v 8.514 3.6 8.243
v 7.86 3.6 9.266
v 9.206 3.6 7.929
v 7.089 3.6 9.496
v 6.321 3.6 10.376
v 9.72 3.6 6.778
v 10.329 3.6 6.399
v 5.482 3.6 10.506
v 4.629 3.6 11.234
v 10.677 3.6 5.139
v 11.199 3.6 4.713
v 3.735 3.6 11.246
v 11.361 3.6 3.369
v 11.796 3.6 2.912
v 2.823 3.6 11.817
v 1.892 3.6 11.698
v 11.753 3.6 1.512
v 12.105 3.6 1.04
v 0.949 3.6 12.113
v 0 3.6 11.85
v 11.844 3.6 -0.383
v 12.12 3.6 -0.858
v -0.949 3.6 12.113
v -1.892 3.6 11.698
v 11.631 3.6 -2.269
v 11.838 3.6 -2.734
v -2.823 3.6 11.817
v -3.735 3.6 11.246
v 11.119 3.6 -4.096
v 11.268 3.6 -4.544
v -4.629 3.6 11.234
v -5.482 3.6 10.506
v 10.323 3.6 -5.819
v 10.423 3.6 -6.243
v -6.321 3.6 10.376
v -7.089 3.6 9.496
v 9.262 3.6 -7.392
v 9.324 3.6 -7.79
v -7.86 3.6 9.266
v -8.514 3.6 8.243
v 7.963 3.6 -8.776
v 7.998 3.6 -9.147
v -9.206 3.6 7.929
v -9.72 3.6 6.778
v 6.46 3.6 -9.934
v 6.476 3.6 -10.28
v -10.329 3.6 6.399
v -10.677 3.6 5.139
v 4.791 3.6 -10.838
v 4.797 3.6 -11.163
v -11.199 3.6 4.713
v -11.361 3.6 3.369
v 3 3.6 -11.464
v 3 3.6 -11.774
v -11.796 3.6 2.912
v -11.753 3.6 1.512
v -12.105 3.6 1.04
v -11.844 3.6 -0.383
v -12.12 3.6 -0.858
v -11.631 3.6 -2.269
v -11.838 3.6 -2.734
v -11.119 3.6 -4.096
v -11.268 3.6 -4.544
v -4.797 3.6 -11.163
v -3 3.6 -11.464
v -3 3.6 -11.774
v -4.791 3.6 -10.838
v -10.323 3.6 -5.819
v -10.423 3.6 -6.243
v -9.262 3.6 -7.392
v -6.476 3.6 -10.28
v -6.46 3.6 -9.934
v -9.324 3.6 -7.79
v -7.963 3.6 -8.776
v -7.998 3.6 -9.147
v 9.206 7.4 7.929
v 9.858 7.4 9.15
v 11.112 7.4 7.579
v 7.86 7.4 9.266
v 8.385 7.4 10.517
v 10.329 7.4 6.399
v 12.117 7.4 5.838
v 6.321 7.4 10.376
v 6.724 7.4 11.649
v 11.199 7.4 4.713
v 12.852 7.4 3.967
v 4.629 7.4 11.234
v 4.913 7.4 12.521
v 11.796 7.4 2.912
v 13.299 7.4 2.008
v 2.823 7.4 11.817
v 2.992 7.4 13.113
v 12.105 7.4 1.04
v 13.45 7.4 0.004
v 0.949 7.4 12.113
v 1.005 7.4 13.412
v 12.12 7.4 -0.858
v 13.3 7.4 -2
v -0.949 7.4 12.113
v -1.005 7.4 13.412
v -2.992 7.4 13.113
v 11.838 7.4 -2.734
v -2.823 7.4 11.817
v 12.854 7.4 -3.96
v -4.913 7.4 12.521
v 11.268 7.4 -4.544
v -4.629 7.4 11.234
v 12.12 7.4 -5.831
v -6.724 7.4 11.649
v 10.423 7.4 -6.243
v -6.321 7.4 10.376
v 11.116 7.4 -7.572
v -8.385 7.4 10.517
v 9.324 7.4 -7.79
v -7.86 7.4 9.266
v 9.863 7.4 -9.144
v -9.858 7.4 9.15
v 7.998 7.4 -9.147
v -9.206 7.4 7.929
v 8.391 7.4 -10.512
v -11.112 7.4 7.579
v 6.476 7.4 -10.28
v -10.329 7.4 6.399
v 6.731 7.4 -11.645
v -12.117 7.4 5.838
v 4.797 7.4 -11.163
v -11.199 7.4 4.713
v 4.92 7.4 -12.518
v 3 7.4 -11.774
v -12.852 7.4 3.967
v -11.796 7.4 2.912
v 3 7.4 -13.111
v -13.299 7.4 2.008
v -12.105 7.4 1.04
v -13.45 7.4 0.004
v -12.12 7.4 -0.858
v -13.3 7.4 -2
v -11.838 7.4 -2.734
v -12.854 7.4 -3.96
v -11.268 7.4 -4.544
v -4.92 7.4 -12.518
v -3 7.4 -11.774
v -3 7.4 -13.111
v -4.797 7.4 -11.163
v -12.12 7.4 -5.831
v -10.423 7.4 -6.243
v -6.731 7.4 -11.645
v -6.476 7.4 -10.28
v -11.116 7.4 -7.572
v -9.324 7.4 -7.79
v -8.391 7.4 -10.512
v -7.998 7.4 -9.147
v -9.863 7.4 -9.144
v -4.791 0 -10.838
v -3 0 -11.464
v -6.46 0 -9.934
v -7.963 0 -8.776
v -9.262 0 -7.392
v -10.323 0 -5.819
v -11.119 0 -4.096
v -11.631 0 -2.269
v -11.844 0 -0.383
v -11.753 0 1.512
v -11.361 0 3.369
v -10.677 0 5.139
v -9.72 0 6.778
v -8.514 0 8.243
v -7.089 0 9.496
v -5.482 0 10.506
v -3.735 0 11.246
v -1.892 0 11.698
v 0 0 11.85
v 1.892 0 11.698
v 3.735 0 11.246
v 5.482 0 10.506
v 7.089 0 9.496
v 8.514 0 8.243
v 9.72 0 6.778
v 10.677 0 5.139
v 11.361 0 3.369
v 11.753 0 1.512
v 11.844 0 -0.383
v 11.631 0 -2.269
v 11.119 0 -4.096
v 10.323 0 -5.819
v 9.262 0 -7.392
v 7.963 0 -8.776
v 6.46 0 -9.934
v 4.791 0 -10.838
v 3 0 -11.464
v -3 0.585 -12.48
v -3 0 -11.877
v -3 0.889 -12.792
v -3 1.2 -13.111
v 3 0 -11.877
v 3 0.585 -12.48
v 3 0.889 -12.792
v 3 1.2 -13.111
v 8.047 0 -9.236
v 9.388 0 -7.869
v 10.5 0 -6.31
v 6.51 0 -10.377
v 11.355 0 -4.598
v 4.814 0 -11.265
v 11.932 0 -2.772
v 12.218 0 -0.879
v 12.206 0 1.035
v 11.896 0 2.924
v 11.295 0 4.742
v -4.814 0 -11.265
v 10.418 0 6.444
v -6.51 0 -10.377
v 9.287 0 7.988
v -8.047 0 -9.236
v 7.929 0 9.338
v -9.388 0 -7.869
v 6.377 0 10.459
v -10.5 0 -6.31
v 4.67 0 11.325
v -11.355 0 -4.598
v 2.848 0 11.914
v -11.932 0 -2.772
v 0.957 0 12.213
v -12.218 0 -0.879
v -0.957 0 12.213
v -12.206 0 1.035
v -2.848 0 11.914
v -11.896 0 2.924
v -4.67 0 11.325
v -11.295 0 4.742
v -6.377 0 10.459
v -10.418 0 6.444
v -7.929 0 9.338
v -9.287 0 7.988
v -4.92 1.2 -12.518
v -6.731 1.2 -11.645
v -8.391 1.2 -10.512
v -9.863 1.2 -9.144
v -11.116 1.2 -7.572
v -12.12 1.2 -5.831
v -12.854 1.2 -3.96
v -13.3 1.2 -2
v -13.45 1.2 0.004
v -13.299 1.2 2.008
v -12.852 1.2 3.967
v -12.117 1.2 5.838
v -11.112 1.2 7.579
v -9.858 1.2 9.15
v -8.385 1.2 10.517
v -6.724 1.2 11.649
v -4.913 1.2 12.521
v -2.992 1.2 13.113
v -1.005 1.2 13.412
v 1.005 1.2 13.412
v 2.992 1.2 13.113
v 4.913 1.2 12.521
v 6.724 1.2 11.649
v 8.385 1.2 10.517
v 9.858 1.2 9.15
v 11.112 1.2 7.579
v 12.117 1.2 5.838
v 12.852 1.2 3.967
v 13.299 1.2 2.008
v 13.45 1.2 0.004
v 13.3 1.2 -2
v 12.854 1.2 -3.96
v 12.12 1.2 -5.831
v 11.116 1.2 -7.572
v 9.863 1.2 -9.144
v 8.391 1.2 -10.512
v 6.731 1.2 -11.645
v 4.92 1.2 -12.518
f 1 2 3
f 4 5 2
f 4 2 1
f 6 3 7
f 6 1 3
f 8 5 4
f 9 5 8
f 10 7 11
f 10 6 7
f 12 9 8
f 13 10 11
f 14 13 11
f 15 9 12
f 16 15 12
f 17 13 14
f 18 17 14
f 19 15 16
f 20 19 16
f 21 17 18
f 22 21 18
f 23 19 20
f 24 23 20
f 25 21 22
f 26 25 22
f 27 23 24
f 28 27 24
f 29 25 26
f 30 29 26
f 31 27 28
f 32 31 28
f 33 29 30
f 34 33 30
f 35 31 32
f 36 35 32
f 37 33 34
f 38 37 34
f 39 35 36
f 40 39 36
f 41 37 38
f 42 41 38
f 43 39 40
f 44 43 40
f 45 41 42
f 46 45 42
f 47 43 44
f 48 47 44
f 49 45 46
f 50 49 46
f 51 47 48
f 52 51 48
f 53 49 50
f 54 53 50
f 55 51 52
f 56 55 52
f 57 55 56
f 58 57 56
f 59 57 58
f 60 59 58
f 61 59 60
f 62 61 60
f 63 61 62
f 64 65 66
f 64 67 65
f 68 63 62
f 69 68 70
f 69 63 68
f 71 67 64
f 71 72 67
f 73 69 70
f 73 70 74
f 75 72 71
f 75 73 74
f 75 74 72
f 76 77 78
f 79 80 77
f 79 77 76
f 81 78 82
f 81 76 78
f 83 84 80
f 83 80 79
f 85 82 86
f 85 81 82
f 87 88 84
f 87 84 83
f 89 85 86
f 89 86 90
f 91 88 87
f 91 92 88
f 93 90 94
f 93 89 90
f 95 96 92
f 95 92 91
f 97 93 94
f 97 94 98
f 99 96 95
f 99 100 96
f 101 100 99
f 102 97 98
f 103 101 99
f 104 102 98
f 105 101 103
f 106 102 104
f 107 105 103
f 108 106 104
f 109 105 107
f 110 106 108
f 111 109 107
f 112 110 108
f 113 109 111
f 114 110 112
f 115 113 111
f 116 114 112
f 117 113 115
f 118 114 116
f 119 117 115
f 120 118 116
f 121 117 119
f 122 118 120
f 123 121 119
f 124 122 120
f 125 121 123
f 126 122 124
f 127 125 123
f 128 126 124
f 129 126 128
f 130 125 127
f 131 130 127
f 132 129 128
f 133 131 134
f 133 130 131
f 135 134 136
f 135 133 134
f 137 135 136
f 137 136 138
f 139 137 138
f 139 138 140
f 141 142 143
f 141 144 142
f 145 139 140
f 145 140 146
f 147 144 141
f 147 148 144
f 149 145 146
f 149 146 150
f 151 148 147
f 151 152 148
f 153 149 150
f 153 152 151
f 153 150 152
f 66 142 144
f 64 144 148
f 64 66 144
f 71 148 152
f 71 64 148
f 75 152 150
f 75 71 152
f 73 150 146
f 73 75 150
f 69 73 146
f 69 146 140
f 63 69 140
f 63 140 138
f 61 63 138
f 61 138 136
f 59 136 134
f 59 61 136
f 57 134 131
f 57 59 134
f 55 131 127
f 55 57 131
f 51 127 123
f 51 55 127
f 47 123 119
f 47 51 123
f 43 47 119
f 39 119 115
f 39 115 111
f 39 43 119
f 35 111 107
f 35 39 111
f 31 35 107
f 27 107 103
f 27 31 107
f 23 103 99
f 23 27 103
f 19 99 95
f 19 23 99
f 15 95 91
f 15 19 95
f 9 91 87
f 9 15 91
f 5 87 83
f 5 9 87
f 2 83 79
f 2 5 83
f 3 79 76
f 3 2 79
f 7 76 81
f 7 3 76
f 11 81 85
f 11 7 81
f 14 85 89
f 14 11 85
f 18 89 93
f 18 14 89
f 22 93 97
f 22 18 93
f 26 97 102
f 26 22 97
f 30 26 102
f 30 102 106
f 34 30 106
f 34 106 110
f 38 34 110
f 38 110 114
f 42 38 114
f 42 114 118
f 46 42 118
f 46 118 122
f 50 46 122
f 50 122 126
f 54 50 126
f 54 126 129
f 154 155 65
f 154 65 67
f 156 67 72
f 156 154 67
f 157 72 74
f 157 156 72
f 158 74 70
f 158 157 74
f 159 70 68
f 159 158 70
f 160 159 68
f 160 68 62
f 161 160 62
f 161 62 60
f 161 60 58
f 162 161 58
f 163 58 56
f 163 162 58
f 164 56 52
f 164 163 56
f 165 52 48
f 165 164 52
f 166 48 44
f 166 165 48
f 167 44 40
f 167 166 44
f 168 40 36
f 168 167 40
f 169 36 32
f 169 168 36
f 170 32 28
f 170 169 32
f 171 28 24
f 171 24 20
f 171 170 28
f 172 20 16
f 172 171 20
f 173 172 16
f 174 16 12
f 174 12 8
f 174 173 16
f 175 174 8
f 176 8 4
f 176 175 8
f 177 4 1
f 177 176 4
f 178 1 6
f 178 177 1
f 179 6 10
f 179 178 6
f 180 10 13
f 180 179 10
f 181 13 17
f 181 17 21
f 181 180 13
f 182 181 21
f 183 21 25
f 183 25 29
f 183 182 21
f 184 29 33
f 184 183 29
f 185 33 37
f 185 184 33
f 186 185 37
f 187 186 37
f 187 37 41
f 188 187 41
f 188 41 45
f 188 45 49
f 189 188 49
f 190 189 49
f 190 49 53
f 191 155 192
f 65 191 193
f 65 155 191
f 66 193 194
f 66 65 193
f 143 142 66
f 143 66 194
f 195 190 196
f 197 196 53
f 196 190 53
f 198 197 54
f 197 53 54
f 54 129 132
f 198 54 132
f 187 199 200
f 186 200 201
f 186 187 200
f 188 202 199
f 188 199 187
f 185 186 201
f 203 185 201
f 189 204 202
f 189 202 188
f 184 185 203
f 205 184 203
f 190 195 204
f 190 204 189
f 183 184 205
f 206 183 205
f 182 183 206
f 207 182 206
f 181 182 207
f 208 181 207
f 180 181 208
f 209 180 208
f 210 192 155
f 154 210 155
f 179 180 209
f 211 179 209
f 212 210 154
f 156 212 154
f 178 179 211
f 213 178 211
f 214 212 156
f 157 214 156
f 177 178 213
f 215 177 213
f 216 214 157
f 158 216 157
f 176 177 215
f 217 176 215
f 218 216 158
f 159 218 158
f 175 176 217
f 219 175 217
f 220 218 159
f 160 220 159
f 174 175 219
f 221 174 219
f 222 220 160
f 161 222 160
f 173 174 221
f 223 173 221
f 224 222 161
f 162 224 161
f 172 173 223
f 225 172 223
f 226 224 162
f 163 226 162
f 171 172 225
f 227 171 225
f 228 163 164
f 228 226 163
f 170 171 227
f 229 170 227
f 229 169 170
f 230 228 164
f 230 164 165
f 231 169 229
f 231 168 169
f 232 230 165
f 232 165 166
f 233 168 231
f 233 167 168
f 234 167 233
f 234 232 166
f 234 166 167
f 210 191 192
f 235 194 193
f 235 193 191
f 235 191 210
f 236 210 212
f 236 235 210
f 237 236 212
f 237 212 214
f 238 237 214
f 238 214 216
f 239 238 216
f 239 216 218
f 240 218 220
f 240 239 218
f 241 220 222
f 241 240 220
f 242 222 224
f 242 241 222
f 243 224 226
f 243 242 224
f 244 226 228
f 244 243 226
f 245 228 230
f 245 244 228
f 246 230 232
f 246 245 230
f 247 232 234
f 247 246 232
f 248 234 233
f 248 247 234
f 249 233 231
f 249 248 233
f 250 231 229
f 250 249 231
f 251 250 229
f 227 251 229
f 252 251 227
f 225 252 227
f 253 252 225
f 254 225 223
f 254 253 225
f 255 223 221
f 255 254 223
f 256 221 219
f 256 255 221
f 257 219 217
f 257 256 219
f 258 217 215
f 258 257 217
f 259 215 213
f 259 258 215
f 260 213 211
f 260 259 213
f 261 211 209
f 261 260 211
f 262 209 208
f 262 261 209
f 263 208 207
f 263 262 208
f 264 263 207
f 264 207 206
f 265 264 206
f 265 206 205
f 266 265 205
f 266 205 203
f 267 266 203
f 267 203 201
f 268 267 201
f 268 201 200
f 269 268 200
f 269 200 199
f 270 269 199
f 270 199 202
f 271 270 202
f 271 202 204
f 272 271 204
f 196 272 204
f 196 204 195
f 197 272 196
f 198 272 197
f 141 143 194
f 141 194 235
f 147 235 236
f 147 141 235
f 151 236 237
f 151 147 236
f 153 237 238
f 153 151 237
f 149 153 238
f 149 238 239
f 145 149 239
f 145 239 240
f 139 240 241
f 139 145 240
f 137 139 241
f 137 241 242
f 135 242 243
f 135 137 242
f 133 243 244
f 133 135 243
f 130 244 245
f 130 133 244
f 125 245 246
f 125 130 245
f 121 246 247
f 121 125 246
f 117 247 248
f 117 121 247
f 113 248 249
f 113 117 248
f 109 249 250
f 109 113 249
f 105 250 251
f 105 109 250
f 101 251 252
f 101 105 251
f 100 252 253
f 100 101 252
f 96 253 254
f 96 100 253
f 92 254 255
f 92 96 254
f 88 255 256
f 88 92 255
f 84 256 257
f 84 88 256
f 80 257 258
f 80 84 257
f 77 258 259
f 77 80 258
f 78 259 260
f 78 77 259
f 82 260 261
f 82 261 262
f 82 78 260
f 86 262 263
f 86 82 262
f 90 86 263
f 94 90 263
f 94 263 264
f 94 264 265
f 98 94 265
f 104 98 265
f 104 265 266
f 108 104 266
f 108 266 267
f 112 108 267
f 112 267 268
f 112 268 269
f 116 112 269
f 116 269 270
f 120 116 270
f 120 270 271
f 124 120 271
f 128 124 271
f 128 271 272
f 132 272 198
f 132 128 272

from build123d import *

# Parameters (mm, degrees)
CHAMFER_1_SIZE      = 1.2
CUT_EXTRUDE_1_REACH = 22.41
SKETCH_2_W          = 6
SKETCH_2_H          = 10


with BuildPart() as part:
    # Эскиз1 → Повернуть1 (revolve)
    with BuildSketch(Plane.XY, mode=Mode.PRIVATE) as revolve_1_sk:
        Polygon((-11.85, 0), (-13.45, 0), (-13.45, 7.4), (-12.15, 7.4), (-12.15, 3.6), (-11.85, 3.6), align=None)
    revolve(revolve_1_sk.sketch.rotate(Axis((0, 0, 0), (0, 1, 0)), 270), axis=Axis((0, 0, 0), (0, 1, 0)))

    # Фаска1
    chamfer_1_edges = [part.edges().sort_by_distance(p)[0] for p in [
        (0, 0, 13.45),
    ]]
    chamfer(chamfer_1_edges, length=CHAMFER_1_SIZE)

    # Эскиз2 → Вырез-Вытянуть1 (cut, up to next)
    with BuildSketch(Plane(origin=(0, 7.4, 0), x_dir=(1, 0, 0), z_dir=(0, 1, 0)), mode=Mode.PRIVATE) as cut_extrude_1_sk1:
        with Locations((0, 12)):
            Rectangle(SKETCH_2_W, SKETCH_2_H)
    cut_extrude_1_tool1 = extrude(cut_extrude_1_sk1.sketch, amount=-CUT_EXTRUDE_1_REACH, mode=Mode.PRIVATE) & part.part
    add(cut_extrude_1_tool1.solids().sort_by_distance((0, 7.4, -12))[0], mode=Mode.SUBTRACT)


solid = part.part
